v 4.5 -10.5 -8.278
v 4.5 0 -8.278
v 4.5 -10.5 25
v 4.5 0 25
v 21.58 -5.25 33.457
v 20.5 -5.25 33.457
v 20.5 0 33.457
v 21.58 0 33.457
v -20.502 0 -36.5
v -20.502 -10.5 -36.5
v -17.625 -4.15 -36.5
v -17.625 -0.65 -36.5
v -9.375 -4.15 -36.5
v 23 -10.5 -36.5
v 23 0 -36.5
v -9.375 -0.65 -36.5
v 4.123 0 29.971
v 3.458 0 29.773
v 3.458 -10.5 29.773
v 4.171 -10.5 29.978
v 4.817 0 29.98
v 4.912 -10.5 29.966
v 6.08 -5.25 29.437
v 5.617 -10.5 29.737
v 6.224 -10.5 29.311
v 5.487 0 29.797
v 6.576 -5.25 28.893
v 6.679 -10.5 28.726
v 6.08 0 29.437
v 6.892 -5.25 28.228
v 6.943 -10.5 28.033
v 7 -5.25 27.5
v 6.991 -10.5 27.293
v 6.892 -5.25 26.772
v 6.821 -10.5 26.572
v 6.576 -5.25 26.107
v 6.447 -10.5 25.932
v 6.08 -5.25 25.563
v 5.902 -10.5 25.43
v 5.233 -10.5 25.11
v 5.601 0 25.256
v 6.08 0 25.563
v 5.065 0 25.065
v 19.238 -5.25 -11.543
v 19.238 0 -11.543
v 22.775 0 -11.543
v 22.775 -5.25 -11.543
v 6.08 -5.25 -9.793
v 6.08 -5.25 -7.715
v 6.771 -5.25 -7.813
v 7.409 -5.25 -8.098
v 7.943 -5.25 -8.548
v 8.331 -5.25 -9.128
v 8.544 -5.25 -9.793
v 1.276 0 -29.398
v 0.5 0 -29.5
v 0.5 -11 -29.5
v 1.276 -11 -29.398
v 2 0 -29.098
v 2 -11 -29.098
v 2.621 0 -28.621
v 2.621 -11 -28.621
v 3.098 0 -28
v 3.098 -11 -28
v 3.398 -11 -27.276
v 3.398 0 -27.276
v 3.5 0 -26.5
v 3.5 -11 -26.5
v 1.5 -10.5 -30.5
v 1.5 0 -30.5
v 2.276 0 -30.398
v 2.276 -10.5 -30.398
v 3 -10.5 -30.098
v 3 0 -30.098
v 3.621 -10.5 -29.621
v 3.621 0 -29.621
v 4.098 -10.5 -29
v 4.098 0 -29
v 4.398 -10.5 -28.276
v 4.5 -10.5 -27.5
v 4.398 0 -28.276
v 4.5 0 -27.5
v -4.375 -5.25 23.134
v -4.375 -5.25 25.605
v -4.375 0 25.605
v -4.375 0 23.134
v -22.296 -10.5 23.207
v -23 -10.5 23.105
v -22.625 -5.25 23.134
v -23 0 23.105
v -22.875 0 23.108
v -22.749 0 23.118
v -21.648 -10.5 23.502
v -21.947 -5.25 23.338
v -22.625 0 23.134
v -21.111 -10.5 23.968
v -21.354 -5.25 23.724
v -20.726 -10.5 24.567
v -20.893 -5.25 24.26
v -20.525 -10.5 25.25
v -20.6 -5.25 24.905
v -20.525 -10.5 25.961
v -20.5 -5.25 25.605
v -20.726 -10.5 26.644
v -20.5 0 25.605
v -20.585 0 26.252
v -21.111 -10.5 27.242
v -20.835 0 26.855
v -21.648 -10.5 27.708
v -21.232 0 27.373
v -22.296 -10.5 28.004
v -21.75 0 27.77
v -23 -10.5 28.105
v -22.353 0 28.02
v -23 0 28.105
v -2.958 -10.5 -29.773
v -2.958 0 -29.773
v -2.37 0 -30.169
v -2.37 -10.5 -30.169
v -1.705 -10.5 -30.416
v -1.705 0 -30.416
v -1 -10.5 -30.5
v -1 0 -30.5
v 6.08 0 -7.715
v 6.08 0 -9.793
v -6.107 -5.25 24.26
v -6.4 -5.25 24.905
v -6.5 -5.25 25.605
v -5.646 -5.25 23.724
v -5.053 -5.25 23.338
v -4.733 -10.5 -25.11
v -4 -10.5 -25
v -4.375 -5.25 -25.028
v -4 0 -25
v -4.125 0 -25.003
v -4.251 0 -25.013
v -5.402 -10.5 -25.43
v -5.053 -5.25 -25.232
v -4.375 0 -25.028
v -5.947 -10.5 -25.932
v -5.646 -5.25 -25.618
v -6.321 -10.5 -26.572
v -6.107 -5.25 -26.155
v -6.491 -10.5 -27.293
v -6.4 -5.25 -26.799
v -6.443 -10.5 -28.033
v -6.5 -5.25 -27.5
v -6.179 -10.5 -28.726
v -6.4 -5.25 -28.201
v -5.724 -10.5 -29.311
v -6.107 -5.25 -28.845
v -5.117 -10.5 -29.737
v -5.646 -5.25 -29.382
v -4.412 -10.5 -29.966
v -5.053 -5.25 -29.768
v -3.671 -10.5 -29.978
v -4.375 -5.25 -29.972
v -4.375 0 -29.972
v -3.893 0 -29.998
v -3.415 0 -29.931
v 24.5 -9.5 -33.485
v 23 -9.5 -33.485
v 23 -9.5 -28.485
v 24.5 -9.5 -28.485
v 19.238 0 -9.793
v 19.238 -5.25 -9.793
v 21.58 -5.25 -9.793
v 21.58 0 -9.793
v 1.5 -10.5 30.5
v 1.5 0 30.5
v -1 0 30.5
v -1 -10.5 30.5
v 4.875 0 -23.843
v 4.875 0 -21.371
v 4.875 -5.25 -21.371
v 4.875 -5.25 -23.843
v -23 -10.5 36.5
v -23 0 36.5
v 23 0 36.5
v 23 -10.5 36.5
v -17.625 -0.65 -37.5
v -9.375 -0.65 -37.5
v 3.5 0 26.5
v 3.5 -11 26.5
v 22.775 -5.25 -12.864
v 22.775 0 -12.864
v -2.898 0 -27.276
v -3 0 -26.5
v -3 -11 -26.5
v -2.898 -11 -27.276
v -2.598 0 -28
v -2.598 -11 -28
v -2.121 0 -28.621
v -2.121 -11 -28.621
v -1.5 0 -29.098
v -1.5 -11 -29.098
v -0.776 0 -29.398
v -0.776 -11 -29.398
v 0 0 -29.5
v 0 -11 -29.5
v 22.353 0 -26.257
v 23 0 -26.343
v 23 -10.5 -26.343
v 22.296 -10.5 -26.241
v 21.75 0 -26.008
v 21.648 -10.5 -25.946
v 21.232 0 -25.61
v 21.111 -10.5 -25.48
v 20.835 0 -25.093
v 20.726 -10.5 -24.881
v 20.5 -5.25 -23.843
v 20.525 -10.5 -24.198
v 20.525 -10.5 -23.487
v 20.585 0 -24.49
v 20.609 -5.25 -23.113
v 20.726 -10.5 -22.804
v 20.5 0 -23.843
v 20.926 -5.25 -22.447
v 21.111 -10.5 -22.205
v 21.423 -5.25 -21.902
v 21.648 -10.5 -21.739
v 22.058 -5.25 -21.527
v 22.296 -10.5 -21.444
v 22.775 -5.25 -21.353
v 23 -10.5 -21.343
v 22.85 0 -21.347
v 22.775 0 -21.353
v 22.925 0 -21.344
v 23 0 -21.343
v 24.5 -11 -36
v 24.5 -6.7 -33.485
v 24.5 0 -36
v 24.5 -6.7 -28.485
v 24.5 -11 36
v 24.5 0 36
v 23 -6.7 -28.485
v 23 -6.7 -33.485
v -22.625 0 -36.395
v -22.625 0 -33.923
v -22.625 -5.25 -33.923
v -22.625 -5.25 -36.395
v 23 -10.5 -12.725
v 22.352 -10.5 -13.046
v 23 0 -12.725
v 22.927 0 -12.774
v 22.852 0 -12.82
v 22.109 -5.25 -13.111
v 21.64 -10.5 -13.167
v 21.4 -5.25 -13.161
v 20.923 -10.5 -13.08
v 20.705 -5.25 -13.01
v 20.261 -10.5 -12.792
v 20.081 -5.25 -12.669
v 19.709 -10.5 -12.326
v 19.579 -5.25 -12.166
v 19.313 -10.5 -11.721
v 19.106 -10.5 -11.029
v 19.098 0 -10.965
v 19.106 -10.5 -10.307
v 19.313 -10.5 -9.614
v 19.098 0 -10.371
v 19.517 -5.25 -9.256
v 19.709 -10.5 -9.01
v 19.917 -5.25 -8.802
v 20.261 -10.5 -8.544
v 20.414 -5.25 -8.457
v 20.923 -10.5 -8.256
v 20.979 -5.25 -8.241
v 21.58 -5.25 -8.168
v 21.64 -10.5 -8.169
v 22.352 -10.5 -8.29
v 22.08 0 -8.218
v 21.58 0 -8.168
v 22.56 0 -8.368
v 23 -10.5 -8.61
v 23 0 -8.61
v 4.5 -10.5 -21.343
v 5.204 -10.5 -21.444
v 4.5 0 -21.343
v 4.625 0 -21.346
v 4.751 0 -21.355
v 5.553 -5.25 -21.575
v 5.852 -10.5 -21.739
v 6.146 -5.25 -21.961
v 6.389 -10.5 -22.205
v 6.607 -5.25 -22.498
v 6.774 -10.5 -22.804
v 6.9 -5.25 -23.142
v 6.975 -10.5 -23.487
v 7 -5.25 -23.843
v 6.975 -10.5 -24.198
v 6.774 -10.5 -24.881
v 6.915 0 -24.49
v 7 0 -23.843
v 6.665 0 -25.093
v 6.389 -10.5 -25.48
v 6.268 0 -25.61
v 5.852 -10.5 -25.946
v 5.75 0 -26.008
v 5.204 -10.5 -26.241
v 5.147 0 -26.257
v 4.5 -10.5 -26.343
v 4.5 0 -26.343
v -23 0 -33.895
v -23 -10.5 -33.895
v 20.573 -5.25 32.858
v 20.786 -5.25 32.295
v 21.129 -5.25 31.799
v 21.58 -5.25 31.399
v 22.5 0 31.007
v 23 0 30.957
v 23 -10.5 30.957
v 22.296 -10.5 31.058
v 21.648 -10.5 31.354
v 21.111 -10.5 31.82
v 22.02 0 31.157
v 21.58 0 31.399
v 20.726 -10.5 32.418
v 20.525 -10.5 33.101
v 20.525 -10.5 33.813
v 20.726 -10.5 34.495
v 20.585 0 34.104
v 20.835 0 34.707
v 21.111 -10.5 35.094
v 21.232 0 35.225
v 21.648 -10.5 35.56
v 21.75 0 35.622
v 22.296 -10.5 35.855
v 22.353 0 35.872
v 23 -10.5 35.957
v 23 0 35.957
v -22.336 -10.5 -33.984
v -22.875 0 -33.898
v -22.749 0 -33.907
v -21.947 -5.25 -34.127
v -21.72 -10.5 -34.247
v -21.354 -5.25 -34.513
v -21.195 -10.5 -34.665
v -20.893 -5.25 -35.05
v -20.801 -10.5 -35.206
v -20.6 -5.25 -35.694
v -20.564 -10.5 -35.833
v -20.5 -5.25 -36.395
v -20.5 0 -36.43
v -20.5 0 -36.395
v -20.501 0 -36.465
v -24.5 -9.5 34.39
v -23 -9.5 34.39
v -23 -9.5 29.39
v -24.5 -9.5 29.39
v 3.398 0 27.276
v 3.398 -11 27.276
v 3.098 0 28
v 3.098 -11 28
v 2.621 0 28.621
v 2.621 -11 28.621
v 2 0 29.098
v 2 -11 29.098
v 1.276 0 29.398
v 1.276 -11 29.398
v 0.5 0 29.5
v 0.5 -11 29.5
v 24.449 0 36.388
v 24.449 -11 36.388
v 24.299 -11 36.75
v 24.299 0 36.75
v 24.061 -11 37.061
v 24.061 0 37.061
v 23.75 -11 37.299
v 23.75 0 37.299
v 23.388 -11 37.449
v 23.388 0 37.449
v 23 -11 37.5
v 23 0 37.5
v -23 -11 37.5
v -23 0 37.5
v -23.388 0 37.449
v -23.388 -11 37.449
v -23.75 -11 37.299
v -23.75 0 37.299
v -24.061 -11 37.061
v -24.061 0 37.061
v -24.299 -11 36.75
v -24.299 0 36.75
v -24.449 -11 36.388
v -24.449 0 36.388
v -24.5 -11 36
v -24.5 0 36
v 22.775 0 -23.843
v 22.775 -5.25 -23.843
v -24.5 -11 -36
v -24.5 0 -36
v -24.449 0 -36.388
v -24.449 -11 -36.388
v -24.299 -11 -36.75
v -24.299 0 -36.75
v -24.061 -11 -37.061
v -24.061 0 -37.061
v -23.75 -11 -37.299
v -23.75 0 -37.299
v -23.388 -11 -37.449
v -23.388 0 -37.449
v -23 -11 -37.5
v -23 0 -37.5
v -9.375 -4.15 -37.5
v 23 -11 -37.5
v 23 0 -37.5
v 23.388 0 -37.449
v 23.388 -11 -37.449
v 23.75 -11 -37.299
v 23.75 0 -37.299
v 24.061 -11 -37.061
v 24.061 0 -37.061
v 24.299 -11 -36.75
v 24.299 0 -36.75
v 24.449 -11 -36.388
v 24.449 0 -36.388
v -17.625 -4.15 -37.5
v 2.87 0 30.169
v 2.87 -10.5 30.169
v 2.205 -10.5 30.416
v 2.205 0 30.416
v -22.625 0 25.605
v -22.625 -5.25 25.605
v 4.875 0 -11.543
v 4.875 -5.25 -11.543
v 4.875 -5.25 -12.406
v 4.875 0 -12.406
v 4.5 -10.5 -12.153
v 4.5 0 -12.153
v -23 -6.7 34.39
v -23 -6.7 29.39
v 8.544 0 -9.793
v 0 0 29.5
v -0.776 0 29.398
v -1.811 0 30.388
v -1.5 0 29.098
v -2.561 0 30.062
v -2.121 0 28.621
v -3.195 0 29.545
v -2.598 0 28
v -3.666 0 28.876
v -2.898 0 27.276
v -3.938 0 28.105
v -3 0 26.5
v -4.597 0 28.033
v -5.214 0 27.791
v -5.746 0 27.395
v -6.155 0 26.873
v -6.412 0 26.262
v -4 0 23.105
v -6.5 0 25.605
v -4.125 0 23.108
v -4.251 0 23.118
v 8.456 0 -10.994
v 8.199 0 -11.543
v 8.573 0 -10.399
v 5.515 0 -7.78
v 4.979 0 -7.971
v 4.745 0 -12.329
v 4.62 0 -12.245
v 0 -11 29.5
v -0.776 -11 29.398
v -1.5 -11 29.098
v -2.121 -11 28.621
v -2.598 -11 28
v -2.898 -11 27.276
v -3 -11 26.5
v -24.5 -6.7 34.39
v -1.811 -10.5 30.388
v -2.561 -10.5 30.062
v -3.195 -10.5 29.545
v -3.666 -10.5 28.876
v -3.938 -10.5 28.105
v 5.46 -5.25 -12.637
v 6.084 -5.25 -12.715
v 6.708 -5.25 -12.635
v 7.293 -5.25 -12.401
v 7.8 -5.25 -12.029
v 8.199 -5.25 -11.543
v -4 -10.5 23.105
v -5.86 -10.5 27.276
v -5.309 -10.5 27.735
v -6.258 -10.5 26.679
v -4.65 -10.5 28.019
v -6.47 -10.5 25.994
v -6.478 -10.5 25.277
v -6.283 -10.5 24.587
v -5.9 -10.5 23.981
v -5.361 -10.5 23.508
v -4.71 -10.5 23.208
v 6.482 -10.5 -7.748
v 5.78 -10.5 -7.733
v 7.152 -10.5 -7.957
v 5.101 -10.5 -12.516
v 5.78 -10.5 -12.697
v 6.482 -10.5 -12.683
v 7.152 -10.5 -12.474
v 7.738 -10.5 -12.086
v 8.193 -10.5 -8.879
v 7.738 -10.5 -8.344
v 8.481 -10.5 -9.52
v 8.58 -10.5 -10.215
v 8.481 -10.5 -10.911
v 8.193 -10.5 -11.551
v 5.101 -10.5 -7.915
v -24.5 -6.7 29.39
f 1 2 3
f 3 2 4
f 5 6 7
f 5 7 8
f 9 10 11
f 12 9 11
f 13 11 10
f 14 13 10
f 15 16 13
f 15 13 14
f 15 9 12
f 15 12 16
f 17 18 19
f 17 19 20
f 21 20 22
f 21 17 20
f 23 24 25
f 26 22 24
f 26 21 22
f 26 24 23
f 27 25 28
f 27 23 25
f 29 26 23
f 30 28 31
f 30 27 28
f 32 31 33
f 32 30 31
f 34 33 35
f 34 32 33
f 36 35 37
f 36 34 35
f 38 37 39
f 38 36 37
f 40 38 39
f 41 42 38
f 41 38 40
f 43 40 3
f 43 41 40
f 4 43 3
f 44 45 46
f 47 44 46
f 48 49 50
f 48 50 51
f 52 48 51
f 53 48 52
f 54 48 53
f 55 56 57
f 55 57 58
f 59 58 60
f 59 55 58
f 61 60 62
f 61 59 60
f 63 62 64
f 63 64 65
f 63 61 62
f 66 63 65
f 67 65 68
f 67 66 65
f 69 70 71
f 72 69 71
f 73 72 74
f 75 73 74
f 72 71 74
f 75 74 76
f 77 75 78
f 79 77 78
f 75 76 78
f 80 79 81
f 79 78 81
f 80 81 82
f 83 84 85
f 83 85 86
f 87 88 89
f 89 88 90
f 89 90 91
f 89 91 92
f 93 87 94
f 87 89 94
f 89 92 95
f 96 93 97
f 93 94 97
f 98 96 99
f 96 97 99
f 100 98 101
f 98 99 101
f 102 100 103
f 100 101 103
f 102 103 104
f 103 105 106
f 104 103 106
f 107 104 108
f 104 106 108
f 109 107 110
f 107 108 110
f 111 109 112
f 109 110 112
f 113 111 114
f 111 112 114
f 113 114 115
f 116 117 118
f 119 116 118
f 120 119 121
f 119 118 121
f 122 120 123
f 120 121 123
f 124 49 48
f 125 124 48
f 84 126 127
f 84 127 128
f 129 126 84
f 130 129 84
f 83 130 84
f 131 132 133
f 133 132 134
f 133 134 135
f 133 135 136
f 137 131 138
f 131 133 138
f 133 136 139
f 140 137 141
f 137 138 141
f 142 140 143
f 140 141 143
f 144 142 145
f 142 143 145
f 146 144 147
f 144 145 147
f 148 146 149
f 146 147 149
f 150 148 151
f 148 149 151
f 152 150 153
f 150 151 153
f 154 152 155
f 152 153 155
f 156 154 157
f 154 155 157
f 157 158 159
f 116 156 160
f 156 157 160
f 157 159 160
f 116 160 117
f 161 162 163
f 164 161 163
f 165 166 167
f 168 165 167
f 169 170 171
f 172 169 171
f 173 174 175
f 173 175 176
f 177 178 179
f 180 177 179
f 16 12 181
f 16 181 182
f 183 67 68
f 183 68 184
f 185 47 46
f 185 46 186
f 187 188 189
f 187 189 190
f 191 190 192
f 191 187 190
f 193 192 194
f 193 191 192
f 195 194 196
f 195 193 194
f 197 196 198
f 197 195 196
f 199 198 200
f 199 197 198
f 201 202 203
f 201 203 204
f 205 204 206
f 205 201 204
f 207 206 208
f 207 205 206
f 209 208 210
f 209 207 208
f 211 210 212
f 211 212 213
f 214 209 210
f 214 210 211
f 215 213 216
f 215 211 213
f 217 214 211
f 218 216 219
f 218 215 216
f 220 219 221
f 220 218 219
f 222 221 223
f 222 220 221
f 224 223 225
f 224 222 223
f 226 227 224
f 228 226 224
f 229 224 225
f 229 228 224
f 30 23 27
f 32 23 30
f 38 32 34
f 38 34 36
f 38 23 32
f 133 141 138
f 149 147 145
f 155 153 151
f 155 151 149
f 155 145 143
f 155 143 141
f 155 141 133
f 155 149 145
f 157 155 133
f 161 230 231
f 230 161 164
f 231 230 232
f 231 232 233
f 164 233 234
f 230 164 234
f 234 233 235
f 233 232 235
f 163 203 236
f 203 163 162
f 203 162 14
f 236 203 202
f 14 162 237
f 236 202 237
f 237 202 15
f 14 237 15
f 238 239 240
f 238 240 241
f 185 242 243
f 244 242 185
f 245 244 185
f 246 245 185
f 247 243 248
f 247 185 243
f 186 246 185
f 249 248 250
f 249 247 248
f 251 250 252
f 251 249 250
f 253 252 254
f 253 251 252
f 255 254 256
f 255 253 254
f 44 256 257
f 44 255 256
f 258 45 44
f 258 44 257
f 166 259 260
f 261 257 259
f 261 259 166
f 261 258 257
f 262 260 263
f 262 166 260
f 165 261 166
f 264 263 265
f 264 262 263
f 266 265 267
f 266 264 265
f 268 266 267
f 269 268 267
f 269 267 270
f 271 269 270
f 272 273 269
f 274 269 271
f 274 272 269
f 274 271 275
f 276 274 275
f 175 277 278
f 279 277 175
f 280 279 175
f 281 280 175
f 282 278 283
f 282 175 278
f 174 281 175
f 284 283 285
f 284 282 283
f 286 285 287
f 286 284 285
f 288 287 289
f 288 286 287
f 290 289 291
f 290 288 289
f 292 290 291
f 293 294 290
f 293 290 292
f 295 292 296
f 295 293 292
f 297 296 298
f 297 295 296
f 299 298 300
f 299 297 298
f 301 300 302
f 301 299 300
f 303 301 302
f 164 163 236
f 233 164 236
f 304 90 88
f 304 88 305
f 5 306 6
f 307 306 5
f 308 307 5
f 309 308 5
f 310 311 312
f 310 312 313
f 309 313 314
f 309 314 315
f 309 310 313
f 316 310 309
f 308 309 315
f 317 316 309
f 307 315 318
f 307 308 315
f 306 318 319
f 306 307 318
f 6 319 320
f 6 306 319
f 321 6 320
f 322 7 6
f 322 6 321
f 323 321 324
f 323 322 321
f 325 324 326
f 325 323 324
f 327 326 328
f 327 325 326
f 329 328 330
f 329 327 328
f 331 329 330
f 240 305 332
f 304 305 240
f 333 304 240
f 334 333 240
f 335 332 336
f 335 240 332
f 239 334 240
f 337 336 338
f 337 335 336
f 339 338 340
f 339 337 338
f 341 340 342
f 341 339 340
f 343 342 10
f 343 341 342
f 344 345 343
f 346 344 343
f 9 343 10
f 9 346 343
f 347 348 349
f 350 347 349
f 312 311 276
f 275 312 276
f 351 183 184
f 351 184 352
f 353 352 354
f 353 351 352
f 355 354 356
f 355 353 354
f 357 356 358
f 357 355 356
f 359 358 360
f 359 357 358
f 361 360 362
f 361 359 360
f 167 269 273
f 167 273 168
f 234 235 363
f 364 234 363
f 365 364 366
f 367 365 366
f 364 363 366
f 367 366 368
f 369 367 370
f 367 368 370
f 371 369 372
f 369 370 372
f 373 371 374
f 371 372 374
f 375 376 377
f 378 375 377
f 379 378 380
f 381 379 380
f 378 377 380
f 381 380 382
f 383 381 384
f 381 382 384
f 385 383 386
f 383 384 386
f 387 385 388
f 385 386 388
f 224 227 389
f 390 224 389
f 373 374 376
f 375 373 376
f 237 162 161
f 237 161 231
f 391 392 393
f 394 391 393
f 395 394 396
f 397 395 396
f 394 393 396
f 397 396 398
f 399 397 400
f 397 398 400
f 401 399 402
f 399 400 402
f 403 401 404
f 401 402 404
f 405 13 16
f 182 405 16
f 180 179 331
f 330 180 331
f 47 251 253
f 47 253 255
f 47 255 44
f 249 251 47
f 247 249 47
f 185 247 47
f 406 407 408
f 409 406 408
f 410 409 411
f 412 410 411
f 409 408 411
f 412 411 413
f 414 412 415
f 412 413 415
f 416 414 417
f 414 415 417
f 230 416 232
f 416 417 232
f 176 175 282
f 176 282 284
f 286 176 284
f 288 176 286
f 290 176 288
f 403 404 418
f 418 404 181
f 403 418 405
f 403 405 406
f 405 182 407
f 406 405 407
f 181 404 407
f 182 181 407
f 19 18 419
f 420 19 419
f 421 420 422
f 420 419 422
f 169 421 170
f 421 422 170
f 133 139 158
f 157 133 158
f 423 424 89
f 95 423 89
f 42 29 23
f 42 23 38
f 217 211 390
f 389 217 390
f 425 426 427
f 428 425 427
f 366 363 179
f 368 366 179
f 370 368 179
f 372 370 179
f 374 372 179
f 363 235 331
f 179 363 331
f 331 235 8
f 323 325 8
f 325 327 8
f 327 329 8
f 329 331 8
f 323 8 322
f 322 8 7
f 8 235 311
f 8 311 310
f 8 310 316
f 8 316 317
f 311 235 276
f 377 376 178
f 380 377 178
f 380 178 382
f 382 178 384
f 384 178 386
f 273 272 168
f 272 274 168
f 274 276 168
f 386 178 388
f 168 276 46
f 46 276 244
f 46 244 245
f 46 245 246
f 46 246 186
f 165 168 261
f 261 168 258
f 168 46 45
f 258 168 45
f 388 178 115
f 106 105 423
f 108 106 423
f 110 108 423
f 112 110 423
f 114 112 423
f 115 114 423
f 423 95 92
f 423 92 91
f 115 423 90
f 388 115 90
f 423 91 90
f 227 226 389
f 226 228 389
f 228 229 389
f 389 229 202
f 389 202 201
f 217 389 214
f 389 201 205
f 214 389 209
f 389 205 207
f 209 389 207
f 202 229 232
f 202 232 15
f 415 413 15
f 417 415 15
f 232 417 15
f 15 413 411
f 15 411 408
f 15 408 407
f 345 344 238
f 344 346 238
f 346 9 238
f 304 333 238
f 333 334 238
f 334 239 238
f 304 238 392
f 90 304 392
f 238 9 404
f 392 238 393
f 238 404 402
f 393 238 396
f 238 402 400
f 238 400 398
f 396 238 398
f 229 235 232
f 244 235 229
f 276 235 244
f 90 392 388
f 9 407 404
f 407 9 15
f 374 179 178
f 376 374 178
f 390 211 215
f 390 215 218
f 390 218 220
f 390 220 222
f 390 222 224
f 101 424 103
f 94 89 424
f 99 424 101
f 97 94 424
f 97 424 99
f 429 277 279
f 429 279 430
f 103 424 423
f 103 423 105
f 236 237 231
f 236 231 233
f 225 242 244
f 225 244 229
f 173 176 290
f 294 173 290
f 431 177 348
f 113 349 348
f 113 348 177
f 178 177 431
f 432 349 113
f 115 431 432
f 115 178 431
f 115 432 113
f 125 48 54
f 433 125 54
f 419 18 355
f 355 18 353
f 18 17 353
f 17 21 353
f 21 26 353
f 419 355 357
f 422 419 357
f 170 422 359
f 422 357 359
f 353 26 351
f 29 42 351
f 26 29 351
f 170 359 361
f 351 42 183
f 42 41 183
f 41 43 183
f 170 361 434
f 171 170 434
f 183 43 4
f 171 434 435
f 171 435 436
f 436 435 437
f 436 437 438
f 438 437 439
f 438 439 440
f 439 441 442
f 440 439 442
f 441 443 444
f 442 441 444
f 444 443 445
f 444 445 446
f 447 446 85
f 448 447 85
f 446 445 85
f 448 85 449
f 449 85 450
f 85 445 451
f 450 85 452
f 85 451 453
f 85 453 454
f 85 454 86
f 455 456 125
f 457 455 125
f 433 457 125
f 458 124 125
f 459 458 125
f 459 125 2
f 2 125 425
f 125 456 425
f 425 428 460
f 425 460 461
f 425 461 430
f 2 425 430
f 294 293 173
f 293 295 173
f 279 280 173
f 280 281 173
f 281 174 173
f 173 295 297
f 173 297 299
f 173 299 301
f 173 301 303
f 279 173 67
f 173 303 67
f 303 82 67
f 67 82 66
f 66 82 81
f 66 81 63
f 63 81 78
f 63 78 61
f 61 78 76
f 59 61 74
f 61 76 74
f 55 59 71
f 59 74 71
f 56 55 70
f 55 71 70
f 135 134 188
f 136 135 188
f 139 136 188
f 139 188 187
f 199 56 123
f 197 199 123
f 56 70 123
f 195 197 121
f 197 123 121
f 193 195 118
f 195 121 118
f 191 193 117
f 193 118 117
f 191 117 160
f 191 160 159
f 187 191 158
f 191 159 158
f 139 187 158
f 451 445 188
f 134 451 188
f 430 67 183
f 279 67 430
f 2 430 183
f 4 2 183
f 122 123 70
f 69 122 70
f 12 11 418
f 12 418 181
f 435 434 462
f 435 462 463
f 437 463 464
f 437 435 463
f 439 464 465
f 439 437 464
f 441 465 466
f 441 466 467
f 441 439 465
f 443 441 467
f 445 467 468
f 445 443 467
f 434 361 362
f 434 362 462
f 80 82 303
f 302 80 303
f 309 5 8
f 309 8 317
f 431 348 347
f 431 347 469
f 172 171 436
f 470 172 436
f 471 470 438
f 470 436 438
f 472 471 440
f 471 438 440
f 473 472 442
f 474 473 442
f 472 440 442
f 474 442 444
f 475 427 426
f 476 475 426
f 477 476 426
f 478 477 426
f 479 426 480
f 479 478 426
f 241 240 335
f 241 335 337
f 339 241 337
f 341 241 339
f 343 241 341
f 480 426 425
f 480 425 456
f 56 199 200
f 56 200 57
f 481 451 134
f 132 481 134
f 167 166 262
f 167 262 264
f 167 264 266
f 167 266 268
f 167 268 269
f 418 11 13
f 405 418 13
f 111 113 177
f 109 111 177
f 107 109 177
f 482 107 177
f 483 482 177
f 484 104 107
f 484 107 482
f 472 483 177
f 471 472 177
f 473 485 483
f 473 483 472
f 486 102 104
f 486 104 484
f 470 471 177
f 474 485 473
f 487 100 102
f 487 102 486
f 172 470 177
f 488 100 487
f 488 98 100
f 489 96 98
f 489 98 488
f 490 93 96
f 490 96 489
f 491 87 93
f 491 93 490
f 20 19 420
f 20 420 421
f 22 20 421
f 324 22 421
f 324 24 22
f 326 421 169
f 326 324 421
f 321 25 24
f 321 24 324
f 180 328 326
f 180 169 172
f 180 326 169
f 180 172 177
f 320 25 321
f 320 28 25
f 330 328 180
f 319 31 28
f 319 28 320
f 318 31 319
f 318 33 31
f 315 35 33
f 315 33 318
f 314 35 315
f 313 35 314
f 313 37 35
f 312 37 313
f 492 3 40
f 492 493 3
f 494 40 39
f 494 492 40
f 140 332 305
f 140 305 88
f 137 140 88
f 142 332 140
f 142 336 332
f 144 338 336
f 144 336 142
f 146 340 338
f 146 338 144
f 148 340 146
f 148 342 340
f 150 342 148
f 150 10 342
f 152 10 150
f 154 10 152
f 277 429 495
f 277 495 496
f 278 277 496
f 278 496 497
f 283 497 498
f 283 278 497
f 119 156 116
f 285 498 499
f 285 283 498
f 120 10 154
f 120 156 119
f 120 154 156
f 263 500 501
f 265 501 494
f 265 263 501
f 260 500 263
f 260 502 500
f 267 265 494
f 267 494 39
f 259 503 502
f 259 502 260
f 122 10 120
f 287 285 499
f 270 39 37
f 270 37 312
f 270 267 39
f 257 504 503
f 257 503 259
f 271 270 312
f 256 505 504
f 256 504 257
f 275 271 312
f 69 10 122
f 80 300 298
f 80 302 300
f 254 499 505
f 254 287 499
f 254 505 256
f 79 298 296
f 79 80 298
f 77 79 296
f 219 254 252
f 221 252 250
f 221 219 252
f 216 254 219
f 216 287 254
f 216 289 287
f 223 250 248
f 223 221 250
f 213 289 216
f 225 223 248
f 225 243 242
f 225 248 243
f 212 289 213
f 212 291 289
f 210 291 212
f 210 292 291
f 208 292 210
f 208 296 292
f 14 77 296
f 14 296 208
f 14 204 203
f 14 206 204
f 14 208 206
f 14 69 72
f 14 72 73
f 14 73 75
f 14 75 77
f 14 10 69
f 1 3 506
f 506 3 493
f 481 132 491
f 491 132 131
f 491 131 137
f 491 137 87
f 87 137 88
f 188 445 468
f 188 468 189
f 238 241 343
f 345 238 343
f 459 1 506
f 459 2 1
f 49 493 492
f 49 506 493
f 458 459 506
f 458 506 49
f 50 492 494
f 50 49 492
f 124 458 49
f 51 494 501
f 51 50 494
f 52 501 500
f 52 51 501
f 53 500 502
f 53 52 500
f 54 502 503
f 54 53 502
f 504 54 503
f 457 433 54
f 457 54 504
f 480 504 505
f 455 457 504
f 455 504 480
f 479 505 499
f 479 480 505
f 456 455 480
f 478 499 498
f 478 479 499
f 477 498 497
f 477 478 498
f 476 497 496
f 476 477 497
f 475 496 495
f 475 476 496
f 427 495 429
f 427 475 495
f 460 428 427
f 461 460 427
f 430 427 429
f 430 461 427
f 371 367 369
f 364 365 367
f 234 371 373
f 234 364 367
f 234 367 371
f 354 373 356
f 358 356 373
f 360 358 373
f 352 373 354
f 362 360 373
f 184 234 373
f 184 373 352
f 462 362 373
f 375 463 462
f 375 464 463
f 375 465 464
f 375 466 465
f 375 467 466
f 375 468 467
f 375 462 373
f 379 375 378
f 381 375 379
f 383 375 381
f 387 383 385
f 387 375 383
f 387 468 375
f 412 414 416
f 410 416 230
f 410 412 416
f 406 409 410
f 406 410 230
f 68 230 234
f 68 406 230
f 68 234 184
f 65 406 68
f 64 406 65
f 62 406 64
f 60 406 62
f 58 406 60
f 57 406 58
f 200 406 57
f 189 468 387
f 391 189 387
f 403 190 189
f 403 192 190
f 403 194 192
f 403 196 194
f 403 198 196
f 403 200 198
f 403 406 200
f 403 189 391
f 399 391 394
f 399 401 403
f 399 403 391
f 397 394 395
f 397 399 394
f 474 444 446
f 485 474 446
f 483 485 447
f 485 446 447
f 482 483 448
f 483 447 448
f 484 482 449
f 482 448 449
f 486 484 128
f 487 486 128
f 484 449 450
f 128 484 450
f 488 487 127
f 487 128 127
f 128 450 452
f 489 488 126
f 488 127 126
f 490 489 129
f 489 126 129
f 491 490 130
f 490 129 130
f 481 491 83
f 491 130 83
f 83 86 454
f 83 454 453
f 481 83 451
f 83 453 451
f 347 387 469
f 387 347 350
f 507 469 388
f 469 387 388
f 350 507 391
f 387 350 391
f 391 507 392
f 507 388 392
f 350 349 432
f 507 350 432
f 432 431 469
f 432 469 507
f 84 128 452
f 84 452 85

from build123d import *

# Parameters (mm, degrees)
BOSS_EXTRUDE1_DEPTH = 11
SKETCH8_W           = 46
SKETCH8_H           = 73
CUT_EXTRUDE1_DEPTH  = 10.5
BOSS_EXTRUDE2_START = 10.5
SKETCH9_R           = 2.5
BOSS_EXTRUDE2_DEPTH = 10.5
SKETCH10_W          = 15.5
SKETCH10_H          = 43.25
SKETCH10_W_2        = 17.9
SKETCH10_H_2        = 12.3
SKETCH10_W_3        = 18.25
SKETCH10_H_3        = 62
CUT_EXTRUDE3_DEPTH  = 5.25
SKETCH11_W          = 5
SKETCH11_H          = 2.8
CUT_EXTRUDE4_DEPTH  = 5
SKETCH12_W          = 5
SKETCH12_H          = 2.8
CUT_EXTRUDE5_DEPTH  = 5
SKETCH14_W          = 8.25
SKETCH14_H          = 3.5
CUT_EXTRUDE6_DEPTH  = 5


with BuildPart() as part:
    # Sketch2 → Boss-Extrude1 (new body)
    with BuildSketch(Plane(origin=(0, 0, 0), x_dir=(1, 0, 0), z_dir=(0, 1, 0))):
        with BuildLine():
            Line((23, -37.5), (-23, -37.5))
            ThreePointArc((-23, -37.5), (-24.060660172, -37.060660172), (-24.5, -36))
            Line((-24.5, -36), (-24.5, 36))
            ThreePointArc((-24.5, 36), (-24.060660172, 37.060660172), (-23, 37.5))
            Line((-23, 37.5), (23, 37.5))
            ThreePointArc((23, 37.5), (24.060660172, 37.060660172), (24.5, 36))
            Line((24.5, 36), (24.5, -36))
            ThreePointArc((24.5, -36), (24.060660172, -37.060660172), (23, -37.5))
        make_face()
        with BuildLine():
            Line((0, 29.5), (0.5, 29.5))
            ThreePointArc((0.5, 29.5), (2.621320344, 28.621320344), (3.5, 26.5))
            Line((3.5, 26.5), (3.5, -26.5))
            ThreePointArc((3.5, -26.5), (2.621320344, -28.621320344), (0.5, -29.5))
            Line((0.5, -29.5), (0, -29.5))
            ThreePointArc((0, -29.5), (-2.121320344, -28.621320344), (-3, -26.5))
            Line((-3, -26.5), (-3, 26.5))
            ThreePointArc((-3, 26.5), (-2.121320344, 28.621320344), (0, 29.5))
        make_face(mode=Mode.SUBTRACT)
    extrude(amount=-BOSS_EXTRUDE1_DEPTH)

    # Sketch8 → Cut-Extrude1 (cut)
    # profile 1 of 2: a face of its own
    with BuildSketch(Plane(origin=(0, 0, 0), x_dir=(1, 0, 0), z_dir=(0, 1, 0))):
        Rectangle(SKETCH8_W, SKETCH8_H)
        with BuildLine():
            Line((-1, 30.5), (1.5, 30.5))
            ThreePointArc((1.5, 30.5), (3.621320344, 29.621320344), (4.5, 27.5))
            Line((4.5, 27.5), (4.5, -27.5))
            ThreePointArc((4.5, -27.5), (3.621320344, -29.621320344), (1.5, -30.5))
            Line((1.5, -30.5), (-1, -30.5))
            ThreePointArc((-1, -30.5), (-3.121320344, -29.621320344), (-4, -27.5))
            Line((-4, -27.5), (-4, 27.5))
            ThreePointArc((-4, 27.5), (-3.121320344, 29.621320344), (-1, 30.5))
        make_face(mode=Mode.SUBTRACT)
    # profile 2 of 2: a face of its own
    with BuildSketch(Plane(origin=(0, 0, 0), x_dir=(1, 0, 0), z_dir=(0, 1, 0))):
        with BuildLine():
            Line((0, 29.5), (0.5, 29.5))
            ThreePointArc((0.5, 29.5), (2.621320344, 28.621320344), (3.5, 26.5))
            Line((3.5, 26.5), (3.5, -26.5))
            ThreePointArc((3.5, -26.5), (2.621320344, -28.621320344), (0.5, -29.5))
            Line((0.5, -29.5), (0, -29.5))
            ThreePointArc((0, -29.5), (-2.121320344, -28.621320344), (-3, -26.5))
            Line((-3, -26.5), (-3, 26.5))
            ThreePointArc((-3, 26.5), (-2.121320344, 28.621320344), (0, 29.5))
        make_face()
    extrude(amount=-CUT_EXTRUDE1_DEPTH, mode=Mode.SUBTRACT)

    # Sketch9 → Boss-Extrude2 (add)
    with BuildSketch(Plane(origin=(0, -10.5, 0), x_dir=(1, 0, 0), z_dir=(0, 1, 0)).offset(BOSS_EXTRUDE2_START)):
        with Locations((21.58, 10.667919779)):
            Circle(SKETCH9_R)
        with Locations((6.08, 10.21529089)):
            Circle(SKETCH9_R)
        with BuildLine():
            Line((24.5, -35.456747529), (24.5, -31.456747529))
            ThreePointArc((24.5, -31.456747529), (20.5, -33.456747529), (24.5, -35.456747529))
        make_face()
        with BuildLine():
            Line((4.5, 26.342587088), (4.5, 21.342587088))
            ThreePointArc((4.5, 21.342587088), (7, 23.842587088), (4.5, 26.342587088))
        make_face()
        with BuildLine():
            Line((-4, 27.5), (-4, 25))
            ThreePointArc((-4, 25), (-6.442500859, 28.033094319), (-2.958333333, 29.772648357))
            ThreePointArc((-2.958333333, 29.772648357), (-3.727178029, 28.75), (-4, 27.5))
        make_face()
        with BuildLine():
            Line((-24.5, -27.605307327), (-24.5, -23.605307327))
            ThreePointArc((-24.5, -23.605307327), (-20.5, -25.605307327), (-24.5, -27.605307327))
        make_face()
        with BuildLine():
            Line((-20.757613835, 37.5), (-23, 37.5))
            ThreePointArc((-23, 37.5), (-24.060660172, 37.060660172), (-24.5, 36))
            Line((-24.5, 36), (-24.5, 34.394692673))
            ThreePointArc((-24.5, 34.394692673), (-21.40359225, 34.470769001), (-20.757613835, 37.5))
        make_face()
        with BuildLine():
            Line((24.5, 21.842587088), (24.5, 25.842587088))
            ThreePointArc((24.5, 25.842587088), (20.5, 23.842587088), (24.5, 21.842587088))
        make_face()
        with BuildLine():
            Line((-4, -23.105307327), (-4, -27.5))
            ThreePointArc((-4, -27.5), (-3.984574172, -27.803837144), (-3.938455326, -28.104549663))
            ThreePointArc((-3.938455326, -28.104549663), (-6.499810577, -25.636081995), (-4, -23.105307327))
        make_face()
        with BuildLine():
            Line((4.5, -25), (4.5, -27.5))
            ThreePointArc((4.5, -27.5), (4.227178029, -28.75), (3.458333333, -29.772648357))
            ThreePointArc((3.458333333, -29.772648357), (6.942500859, -28.033094319), (4.5, -25))
        make_face()
    extrude(amount=-BOSS_EXTRUDE2_DEPTH)

    # Sketch10 → Cut-Extrude3 (cut)
    with BuildSketch(Plane(origin=(0, -5.25, 0), x_dir=(1, 0, 0), z_dir=(0, 1, 0))):
        with Locations((13.83, -11.831747529)):
            Rectangle(SKETCH10_W, SKETCH10_H)
        with Locations((13.825, 17.692587088)):
            Rectangle(SKETCH10_W_2, SKETCH10_H_2)
        with Locations((-13.5, 5.394692673)):
            Rectangle(SKETCH10_W_3, SKETCH10_H_3)
    extrude(amount=CUT_EXTRUDE3_DEPTH, mode=Mode.SUBTRACT)

    # Sketch11 → Cut-Extrude4 (cut)
    with BuildSketch(Plane.ZY.offset(-23)):
        with Locations((-30.985, -8.1)):
            Rectangle(SKETCH11_W, SKETCH11_H)
    extrude(amount=-CUT_EXTRUDE4_DEPTH, mode=Mode.SUBTRACT)

    # Sketch12 → Cut-Extrude5 (cut)
    with BuildSketch(Plane(origin=(-23, 0, 0), x_dir=(0, 0, -1), z_dir=(1, 0, 0))):
        with Locations((-31.89, -8.1)):
            Rectangle(SKETCH12_W, SKETCH12_H)
    extrude(amount=-CUT_EXTRUDE5_DEPTH, mode=Mode.SUBTRACT)

    # Sketch14 → Cut-Extrude6 (cut)
    with BuildSketch(Plane.XY.offset(-36.5)):
        with Locations((-13.5, -2.4)):
            Rectangle(SKETCH14_W, SKETCH14_H)
    extrude(amount=-CUT_EXTRUDE6_DEPTH, mode=Mode.SUBTRACT)


solid = part.part
